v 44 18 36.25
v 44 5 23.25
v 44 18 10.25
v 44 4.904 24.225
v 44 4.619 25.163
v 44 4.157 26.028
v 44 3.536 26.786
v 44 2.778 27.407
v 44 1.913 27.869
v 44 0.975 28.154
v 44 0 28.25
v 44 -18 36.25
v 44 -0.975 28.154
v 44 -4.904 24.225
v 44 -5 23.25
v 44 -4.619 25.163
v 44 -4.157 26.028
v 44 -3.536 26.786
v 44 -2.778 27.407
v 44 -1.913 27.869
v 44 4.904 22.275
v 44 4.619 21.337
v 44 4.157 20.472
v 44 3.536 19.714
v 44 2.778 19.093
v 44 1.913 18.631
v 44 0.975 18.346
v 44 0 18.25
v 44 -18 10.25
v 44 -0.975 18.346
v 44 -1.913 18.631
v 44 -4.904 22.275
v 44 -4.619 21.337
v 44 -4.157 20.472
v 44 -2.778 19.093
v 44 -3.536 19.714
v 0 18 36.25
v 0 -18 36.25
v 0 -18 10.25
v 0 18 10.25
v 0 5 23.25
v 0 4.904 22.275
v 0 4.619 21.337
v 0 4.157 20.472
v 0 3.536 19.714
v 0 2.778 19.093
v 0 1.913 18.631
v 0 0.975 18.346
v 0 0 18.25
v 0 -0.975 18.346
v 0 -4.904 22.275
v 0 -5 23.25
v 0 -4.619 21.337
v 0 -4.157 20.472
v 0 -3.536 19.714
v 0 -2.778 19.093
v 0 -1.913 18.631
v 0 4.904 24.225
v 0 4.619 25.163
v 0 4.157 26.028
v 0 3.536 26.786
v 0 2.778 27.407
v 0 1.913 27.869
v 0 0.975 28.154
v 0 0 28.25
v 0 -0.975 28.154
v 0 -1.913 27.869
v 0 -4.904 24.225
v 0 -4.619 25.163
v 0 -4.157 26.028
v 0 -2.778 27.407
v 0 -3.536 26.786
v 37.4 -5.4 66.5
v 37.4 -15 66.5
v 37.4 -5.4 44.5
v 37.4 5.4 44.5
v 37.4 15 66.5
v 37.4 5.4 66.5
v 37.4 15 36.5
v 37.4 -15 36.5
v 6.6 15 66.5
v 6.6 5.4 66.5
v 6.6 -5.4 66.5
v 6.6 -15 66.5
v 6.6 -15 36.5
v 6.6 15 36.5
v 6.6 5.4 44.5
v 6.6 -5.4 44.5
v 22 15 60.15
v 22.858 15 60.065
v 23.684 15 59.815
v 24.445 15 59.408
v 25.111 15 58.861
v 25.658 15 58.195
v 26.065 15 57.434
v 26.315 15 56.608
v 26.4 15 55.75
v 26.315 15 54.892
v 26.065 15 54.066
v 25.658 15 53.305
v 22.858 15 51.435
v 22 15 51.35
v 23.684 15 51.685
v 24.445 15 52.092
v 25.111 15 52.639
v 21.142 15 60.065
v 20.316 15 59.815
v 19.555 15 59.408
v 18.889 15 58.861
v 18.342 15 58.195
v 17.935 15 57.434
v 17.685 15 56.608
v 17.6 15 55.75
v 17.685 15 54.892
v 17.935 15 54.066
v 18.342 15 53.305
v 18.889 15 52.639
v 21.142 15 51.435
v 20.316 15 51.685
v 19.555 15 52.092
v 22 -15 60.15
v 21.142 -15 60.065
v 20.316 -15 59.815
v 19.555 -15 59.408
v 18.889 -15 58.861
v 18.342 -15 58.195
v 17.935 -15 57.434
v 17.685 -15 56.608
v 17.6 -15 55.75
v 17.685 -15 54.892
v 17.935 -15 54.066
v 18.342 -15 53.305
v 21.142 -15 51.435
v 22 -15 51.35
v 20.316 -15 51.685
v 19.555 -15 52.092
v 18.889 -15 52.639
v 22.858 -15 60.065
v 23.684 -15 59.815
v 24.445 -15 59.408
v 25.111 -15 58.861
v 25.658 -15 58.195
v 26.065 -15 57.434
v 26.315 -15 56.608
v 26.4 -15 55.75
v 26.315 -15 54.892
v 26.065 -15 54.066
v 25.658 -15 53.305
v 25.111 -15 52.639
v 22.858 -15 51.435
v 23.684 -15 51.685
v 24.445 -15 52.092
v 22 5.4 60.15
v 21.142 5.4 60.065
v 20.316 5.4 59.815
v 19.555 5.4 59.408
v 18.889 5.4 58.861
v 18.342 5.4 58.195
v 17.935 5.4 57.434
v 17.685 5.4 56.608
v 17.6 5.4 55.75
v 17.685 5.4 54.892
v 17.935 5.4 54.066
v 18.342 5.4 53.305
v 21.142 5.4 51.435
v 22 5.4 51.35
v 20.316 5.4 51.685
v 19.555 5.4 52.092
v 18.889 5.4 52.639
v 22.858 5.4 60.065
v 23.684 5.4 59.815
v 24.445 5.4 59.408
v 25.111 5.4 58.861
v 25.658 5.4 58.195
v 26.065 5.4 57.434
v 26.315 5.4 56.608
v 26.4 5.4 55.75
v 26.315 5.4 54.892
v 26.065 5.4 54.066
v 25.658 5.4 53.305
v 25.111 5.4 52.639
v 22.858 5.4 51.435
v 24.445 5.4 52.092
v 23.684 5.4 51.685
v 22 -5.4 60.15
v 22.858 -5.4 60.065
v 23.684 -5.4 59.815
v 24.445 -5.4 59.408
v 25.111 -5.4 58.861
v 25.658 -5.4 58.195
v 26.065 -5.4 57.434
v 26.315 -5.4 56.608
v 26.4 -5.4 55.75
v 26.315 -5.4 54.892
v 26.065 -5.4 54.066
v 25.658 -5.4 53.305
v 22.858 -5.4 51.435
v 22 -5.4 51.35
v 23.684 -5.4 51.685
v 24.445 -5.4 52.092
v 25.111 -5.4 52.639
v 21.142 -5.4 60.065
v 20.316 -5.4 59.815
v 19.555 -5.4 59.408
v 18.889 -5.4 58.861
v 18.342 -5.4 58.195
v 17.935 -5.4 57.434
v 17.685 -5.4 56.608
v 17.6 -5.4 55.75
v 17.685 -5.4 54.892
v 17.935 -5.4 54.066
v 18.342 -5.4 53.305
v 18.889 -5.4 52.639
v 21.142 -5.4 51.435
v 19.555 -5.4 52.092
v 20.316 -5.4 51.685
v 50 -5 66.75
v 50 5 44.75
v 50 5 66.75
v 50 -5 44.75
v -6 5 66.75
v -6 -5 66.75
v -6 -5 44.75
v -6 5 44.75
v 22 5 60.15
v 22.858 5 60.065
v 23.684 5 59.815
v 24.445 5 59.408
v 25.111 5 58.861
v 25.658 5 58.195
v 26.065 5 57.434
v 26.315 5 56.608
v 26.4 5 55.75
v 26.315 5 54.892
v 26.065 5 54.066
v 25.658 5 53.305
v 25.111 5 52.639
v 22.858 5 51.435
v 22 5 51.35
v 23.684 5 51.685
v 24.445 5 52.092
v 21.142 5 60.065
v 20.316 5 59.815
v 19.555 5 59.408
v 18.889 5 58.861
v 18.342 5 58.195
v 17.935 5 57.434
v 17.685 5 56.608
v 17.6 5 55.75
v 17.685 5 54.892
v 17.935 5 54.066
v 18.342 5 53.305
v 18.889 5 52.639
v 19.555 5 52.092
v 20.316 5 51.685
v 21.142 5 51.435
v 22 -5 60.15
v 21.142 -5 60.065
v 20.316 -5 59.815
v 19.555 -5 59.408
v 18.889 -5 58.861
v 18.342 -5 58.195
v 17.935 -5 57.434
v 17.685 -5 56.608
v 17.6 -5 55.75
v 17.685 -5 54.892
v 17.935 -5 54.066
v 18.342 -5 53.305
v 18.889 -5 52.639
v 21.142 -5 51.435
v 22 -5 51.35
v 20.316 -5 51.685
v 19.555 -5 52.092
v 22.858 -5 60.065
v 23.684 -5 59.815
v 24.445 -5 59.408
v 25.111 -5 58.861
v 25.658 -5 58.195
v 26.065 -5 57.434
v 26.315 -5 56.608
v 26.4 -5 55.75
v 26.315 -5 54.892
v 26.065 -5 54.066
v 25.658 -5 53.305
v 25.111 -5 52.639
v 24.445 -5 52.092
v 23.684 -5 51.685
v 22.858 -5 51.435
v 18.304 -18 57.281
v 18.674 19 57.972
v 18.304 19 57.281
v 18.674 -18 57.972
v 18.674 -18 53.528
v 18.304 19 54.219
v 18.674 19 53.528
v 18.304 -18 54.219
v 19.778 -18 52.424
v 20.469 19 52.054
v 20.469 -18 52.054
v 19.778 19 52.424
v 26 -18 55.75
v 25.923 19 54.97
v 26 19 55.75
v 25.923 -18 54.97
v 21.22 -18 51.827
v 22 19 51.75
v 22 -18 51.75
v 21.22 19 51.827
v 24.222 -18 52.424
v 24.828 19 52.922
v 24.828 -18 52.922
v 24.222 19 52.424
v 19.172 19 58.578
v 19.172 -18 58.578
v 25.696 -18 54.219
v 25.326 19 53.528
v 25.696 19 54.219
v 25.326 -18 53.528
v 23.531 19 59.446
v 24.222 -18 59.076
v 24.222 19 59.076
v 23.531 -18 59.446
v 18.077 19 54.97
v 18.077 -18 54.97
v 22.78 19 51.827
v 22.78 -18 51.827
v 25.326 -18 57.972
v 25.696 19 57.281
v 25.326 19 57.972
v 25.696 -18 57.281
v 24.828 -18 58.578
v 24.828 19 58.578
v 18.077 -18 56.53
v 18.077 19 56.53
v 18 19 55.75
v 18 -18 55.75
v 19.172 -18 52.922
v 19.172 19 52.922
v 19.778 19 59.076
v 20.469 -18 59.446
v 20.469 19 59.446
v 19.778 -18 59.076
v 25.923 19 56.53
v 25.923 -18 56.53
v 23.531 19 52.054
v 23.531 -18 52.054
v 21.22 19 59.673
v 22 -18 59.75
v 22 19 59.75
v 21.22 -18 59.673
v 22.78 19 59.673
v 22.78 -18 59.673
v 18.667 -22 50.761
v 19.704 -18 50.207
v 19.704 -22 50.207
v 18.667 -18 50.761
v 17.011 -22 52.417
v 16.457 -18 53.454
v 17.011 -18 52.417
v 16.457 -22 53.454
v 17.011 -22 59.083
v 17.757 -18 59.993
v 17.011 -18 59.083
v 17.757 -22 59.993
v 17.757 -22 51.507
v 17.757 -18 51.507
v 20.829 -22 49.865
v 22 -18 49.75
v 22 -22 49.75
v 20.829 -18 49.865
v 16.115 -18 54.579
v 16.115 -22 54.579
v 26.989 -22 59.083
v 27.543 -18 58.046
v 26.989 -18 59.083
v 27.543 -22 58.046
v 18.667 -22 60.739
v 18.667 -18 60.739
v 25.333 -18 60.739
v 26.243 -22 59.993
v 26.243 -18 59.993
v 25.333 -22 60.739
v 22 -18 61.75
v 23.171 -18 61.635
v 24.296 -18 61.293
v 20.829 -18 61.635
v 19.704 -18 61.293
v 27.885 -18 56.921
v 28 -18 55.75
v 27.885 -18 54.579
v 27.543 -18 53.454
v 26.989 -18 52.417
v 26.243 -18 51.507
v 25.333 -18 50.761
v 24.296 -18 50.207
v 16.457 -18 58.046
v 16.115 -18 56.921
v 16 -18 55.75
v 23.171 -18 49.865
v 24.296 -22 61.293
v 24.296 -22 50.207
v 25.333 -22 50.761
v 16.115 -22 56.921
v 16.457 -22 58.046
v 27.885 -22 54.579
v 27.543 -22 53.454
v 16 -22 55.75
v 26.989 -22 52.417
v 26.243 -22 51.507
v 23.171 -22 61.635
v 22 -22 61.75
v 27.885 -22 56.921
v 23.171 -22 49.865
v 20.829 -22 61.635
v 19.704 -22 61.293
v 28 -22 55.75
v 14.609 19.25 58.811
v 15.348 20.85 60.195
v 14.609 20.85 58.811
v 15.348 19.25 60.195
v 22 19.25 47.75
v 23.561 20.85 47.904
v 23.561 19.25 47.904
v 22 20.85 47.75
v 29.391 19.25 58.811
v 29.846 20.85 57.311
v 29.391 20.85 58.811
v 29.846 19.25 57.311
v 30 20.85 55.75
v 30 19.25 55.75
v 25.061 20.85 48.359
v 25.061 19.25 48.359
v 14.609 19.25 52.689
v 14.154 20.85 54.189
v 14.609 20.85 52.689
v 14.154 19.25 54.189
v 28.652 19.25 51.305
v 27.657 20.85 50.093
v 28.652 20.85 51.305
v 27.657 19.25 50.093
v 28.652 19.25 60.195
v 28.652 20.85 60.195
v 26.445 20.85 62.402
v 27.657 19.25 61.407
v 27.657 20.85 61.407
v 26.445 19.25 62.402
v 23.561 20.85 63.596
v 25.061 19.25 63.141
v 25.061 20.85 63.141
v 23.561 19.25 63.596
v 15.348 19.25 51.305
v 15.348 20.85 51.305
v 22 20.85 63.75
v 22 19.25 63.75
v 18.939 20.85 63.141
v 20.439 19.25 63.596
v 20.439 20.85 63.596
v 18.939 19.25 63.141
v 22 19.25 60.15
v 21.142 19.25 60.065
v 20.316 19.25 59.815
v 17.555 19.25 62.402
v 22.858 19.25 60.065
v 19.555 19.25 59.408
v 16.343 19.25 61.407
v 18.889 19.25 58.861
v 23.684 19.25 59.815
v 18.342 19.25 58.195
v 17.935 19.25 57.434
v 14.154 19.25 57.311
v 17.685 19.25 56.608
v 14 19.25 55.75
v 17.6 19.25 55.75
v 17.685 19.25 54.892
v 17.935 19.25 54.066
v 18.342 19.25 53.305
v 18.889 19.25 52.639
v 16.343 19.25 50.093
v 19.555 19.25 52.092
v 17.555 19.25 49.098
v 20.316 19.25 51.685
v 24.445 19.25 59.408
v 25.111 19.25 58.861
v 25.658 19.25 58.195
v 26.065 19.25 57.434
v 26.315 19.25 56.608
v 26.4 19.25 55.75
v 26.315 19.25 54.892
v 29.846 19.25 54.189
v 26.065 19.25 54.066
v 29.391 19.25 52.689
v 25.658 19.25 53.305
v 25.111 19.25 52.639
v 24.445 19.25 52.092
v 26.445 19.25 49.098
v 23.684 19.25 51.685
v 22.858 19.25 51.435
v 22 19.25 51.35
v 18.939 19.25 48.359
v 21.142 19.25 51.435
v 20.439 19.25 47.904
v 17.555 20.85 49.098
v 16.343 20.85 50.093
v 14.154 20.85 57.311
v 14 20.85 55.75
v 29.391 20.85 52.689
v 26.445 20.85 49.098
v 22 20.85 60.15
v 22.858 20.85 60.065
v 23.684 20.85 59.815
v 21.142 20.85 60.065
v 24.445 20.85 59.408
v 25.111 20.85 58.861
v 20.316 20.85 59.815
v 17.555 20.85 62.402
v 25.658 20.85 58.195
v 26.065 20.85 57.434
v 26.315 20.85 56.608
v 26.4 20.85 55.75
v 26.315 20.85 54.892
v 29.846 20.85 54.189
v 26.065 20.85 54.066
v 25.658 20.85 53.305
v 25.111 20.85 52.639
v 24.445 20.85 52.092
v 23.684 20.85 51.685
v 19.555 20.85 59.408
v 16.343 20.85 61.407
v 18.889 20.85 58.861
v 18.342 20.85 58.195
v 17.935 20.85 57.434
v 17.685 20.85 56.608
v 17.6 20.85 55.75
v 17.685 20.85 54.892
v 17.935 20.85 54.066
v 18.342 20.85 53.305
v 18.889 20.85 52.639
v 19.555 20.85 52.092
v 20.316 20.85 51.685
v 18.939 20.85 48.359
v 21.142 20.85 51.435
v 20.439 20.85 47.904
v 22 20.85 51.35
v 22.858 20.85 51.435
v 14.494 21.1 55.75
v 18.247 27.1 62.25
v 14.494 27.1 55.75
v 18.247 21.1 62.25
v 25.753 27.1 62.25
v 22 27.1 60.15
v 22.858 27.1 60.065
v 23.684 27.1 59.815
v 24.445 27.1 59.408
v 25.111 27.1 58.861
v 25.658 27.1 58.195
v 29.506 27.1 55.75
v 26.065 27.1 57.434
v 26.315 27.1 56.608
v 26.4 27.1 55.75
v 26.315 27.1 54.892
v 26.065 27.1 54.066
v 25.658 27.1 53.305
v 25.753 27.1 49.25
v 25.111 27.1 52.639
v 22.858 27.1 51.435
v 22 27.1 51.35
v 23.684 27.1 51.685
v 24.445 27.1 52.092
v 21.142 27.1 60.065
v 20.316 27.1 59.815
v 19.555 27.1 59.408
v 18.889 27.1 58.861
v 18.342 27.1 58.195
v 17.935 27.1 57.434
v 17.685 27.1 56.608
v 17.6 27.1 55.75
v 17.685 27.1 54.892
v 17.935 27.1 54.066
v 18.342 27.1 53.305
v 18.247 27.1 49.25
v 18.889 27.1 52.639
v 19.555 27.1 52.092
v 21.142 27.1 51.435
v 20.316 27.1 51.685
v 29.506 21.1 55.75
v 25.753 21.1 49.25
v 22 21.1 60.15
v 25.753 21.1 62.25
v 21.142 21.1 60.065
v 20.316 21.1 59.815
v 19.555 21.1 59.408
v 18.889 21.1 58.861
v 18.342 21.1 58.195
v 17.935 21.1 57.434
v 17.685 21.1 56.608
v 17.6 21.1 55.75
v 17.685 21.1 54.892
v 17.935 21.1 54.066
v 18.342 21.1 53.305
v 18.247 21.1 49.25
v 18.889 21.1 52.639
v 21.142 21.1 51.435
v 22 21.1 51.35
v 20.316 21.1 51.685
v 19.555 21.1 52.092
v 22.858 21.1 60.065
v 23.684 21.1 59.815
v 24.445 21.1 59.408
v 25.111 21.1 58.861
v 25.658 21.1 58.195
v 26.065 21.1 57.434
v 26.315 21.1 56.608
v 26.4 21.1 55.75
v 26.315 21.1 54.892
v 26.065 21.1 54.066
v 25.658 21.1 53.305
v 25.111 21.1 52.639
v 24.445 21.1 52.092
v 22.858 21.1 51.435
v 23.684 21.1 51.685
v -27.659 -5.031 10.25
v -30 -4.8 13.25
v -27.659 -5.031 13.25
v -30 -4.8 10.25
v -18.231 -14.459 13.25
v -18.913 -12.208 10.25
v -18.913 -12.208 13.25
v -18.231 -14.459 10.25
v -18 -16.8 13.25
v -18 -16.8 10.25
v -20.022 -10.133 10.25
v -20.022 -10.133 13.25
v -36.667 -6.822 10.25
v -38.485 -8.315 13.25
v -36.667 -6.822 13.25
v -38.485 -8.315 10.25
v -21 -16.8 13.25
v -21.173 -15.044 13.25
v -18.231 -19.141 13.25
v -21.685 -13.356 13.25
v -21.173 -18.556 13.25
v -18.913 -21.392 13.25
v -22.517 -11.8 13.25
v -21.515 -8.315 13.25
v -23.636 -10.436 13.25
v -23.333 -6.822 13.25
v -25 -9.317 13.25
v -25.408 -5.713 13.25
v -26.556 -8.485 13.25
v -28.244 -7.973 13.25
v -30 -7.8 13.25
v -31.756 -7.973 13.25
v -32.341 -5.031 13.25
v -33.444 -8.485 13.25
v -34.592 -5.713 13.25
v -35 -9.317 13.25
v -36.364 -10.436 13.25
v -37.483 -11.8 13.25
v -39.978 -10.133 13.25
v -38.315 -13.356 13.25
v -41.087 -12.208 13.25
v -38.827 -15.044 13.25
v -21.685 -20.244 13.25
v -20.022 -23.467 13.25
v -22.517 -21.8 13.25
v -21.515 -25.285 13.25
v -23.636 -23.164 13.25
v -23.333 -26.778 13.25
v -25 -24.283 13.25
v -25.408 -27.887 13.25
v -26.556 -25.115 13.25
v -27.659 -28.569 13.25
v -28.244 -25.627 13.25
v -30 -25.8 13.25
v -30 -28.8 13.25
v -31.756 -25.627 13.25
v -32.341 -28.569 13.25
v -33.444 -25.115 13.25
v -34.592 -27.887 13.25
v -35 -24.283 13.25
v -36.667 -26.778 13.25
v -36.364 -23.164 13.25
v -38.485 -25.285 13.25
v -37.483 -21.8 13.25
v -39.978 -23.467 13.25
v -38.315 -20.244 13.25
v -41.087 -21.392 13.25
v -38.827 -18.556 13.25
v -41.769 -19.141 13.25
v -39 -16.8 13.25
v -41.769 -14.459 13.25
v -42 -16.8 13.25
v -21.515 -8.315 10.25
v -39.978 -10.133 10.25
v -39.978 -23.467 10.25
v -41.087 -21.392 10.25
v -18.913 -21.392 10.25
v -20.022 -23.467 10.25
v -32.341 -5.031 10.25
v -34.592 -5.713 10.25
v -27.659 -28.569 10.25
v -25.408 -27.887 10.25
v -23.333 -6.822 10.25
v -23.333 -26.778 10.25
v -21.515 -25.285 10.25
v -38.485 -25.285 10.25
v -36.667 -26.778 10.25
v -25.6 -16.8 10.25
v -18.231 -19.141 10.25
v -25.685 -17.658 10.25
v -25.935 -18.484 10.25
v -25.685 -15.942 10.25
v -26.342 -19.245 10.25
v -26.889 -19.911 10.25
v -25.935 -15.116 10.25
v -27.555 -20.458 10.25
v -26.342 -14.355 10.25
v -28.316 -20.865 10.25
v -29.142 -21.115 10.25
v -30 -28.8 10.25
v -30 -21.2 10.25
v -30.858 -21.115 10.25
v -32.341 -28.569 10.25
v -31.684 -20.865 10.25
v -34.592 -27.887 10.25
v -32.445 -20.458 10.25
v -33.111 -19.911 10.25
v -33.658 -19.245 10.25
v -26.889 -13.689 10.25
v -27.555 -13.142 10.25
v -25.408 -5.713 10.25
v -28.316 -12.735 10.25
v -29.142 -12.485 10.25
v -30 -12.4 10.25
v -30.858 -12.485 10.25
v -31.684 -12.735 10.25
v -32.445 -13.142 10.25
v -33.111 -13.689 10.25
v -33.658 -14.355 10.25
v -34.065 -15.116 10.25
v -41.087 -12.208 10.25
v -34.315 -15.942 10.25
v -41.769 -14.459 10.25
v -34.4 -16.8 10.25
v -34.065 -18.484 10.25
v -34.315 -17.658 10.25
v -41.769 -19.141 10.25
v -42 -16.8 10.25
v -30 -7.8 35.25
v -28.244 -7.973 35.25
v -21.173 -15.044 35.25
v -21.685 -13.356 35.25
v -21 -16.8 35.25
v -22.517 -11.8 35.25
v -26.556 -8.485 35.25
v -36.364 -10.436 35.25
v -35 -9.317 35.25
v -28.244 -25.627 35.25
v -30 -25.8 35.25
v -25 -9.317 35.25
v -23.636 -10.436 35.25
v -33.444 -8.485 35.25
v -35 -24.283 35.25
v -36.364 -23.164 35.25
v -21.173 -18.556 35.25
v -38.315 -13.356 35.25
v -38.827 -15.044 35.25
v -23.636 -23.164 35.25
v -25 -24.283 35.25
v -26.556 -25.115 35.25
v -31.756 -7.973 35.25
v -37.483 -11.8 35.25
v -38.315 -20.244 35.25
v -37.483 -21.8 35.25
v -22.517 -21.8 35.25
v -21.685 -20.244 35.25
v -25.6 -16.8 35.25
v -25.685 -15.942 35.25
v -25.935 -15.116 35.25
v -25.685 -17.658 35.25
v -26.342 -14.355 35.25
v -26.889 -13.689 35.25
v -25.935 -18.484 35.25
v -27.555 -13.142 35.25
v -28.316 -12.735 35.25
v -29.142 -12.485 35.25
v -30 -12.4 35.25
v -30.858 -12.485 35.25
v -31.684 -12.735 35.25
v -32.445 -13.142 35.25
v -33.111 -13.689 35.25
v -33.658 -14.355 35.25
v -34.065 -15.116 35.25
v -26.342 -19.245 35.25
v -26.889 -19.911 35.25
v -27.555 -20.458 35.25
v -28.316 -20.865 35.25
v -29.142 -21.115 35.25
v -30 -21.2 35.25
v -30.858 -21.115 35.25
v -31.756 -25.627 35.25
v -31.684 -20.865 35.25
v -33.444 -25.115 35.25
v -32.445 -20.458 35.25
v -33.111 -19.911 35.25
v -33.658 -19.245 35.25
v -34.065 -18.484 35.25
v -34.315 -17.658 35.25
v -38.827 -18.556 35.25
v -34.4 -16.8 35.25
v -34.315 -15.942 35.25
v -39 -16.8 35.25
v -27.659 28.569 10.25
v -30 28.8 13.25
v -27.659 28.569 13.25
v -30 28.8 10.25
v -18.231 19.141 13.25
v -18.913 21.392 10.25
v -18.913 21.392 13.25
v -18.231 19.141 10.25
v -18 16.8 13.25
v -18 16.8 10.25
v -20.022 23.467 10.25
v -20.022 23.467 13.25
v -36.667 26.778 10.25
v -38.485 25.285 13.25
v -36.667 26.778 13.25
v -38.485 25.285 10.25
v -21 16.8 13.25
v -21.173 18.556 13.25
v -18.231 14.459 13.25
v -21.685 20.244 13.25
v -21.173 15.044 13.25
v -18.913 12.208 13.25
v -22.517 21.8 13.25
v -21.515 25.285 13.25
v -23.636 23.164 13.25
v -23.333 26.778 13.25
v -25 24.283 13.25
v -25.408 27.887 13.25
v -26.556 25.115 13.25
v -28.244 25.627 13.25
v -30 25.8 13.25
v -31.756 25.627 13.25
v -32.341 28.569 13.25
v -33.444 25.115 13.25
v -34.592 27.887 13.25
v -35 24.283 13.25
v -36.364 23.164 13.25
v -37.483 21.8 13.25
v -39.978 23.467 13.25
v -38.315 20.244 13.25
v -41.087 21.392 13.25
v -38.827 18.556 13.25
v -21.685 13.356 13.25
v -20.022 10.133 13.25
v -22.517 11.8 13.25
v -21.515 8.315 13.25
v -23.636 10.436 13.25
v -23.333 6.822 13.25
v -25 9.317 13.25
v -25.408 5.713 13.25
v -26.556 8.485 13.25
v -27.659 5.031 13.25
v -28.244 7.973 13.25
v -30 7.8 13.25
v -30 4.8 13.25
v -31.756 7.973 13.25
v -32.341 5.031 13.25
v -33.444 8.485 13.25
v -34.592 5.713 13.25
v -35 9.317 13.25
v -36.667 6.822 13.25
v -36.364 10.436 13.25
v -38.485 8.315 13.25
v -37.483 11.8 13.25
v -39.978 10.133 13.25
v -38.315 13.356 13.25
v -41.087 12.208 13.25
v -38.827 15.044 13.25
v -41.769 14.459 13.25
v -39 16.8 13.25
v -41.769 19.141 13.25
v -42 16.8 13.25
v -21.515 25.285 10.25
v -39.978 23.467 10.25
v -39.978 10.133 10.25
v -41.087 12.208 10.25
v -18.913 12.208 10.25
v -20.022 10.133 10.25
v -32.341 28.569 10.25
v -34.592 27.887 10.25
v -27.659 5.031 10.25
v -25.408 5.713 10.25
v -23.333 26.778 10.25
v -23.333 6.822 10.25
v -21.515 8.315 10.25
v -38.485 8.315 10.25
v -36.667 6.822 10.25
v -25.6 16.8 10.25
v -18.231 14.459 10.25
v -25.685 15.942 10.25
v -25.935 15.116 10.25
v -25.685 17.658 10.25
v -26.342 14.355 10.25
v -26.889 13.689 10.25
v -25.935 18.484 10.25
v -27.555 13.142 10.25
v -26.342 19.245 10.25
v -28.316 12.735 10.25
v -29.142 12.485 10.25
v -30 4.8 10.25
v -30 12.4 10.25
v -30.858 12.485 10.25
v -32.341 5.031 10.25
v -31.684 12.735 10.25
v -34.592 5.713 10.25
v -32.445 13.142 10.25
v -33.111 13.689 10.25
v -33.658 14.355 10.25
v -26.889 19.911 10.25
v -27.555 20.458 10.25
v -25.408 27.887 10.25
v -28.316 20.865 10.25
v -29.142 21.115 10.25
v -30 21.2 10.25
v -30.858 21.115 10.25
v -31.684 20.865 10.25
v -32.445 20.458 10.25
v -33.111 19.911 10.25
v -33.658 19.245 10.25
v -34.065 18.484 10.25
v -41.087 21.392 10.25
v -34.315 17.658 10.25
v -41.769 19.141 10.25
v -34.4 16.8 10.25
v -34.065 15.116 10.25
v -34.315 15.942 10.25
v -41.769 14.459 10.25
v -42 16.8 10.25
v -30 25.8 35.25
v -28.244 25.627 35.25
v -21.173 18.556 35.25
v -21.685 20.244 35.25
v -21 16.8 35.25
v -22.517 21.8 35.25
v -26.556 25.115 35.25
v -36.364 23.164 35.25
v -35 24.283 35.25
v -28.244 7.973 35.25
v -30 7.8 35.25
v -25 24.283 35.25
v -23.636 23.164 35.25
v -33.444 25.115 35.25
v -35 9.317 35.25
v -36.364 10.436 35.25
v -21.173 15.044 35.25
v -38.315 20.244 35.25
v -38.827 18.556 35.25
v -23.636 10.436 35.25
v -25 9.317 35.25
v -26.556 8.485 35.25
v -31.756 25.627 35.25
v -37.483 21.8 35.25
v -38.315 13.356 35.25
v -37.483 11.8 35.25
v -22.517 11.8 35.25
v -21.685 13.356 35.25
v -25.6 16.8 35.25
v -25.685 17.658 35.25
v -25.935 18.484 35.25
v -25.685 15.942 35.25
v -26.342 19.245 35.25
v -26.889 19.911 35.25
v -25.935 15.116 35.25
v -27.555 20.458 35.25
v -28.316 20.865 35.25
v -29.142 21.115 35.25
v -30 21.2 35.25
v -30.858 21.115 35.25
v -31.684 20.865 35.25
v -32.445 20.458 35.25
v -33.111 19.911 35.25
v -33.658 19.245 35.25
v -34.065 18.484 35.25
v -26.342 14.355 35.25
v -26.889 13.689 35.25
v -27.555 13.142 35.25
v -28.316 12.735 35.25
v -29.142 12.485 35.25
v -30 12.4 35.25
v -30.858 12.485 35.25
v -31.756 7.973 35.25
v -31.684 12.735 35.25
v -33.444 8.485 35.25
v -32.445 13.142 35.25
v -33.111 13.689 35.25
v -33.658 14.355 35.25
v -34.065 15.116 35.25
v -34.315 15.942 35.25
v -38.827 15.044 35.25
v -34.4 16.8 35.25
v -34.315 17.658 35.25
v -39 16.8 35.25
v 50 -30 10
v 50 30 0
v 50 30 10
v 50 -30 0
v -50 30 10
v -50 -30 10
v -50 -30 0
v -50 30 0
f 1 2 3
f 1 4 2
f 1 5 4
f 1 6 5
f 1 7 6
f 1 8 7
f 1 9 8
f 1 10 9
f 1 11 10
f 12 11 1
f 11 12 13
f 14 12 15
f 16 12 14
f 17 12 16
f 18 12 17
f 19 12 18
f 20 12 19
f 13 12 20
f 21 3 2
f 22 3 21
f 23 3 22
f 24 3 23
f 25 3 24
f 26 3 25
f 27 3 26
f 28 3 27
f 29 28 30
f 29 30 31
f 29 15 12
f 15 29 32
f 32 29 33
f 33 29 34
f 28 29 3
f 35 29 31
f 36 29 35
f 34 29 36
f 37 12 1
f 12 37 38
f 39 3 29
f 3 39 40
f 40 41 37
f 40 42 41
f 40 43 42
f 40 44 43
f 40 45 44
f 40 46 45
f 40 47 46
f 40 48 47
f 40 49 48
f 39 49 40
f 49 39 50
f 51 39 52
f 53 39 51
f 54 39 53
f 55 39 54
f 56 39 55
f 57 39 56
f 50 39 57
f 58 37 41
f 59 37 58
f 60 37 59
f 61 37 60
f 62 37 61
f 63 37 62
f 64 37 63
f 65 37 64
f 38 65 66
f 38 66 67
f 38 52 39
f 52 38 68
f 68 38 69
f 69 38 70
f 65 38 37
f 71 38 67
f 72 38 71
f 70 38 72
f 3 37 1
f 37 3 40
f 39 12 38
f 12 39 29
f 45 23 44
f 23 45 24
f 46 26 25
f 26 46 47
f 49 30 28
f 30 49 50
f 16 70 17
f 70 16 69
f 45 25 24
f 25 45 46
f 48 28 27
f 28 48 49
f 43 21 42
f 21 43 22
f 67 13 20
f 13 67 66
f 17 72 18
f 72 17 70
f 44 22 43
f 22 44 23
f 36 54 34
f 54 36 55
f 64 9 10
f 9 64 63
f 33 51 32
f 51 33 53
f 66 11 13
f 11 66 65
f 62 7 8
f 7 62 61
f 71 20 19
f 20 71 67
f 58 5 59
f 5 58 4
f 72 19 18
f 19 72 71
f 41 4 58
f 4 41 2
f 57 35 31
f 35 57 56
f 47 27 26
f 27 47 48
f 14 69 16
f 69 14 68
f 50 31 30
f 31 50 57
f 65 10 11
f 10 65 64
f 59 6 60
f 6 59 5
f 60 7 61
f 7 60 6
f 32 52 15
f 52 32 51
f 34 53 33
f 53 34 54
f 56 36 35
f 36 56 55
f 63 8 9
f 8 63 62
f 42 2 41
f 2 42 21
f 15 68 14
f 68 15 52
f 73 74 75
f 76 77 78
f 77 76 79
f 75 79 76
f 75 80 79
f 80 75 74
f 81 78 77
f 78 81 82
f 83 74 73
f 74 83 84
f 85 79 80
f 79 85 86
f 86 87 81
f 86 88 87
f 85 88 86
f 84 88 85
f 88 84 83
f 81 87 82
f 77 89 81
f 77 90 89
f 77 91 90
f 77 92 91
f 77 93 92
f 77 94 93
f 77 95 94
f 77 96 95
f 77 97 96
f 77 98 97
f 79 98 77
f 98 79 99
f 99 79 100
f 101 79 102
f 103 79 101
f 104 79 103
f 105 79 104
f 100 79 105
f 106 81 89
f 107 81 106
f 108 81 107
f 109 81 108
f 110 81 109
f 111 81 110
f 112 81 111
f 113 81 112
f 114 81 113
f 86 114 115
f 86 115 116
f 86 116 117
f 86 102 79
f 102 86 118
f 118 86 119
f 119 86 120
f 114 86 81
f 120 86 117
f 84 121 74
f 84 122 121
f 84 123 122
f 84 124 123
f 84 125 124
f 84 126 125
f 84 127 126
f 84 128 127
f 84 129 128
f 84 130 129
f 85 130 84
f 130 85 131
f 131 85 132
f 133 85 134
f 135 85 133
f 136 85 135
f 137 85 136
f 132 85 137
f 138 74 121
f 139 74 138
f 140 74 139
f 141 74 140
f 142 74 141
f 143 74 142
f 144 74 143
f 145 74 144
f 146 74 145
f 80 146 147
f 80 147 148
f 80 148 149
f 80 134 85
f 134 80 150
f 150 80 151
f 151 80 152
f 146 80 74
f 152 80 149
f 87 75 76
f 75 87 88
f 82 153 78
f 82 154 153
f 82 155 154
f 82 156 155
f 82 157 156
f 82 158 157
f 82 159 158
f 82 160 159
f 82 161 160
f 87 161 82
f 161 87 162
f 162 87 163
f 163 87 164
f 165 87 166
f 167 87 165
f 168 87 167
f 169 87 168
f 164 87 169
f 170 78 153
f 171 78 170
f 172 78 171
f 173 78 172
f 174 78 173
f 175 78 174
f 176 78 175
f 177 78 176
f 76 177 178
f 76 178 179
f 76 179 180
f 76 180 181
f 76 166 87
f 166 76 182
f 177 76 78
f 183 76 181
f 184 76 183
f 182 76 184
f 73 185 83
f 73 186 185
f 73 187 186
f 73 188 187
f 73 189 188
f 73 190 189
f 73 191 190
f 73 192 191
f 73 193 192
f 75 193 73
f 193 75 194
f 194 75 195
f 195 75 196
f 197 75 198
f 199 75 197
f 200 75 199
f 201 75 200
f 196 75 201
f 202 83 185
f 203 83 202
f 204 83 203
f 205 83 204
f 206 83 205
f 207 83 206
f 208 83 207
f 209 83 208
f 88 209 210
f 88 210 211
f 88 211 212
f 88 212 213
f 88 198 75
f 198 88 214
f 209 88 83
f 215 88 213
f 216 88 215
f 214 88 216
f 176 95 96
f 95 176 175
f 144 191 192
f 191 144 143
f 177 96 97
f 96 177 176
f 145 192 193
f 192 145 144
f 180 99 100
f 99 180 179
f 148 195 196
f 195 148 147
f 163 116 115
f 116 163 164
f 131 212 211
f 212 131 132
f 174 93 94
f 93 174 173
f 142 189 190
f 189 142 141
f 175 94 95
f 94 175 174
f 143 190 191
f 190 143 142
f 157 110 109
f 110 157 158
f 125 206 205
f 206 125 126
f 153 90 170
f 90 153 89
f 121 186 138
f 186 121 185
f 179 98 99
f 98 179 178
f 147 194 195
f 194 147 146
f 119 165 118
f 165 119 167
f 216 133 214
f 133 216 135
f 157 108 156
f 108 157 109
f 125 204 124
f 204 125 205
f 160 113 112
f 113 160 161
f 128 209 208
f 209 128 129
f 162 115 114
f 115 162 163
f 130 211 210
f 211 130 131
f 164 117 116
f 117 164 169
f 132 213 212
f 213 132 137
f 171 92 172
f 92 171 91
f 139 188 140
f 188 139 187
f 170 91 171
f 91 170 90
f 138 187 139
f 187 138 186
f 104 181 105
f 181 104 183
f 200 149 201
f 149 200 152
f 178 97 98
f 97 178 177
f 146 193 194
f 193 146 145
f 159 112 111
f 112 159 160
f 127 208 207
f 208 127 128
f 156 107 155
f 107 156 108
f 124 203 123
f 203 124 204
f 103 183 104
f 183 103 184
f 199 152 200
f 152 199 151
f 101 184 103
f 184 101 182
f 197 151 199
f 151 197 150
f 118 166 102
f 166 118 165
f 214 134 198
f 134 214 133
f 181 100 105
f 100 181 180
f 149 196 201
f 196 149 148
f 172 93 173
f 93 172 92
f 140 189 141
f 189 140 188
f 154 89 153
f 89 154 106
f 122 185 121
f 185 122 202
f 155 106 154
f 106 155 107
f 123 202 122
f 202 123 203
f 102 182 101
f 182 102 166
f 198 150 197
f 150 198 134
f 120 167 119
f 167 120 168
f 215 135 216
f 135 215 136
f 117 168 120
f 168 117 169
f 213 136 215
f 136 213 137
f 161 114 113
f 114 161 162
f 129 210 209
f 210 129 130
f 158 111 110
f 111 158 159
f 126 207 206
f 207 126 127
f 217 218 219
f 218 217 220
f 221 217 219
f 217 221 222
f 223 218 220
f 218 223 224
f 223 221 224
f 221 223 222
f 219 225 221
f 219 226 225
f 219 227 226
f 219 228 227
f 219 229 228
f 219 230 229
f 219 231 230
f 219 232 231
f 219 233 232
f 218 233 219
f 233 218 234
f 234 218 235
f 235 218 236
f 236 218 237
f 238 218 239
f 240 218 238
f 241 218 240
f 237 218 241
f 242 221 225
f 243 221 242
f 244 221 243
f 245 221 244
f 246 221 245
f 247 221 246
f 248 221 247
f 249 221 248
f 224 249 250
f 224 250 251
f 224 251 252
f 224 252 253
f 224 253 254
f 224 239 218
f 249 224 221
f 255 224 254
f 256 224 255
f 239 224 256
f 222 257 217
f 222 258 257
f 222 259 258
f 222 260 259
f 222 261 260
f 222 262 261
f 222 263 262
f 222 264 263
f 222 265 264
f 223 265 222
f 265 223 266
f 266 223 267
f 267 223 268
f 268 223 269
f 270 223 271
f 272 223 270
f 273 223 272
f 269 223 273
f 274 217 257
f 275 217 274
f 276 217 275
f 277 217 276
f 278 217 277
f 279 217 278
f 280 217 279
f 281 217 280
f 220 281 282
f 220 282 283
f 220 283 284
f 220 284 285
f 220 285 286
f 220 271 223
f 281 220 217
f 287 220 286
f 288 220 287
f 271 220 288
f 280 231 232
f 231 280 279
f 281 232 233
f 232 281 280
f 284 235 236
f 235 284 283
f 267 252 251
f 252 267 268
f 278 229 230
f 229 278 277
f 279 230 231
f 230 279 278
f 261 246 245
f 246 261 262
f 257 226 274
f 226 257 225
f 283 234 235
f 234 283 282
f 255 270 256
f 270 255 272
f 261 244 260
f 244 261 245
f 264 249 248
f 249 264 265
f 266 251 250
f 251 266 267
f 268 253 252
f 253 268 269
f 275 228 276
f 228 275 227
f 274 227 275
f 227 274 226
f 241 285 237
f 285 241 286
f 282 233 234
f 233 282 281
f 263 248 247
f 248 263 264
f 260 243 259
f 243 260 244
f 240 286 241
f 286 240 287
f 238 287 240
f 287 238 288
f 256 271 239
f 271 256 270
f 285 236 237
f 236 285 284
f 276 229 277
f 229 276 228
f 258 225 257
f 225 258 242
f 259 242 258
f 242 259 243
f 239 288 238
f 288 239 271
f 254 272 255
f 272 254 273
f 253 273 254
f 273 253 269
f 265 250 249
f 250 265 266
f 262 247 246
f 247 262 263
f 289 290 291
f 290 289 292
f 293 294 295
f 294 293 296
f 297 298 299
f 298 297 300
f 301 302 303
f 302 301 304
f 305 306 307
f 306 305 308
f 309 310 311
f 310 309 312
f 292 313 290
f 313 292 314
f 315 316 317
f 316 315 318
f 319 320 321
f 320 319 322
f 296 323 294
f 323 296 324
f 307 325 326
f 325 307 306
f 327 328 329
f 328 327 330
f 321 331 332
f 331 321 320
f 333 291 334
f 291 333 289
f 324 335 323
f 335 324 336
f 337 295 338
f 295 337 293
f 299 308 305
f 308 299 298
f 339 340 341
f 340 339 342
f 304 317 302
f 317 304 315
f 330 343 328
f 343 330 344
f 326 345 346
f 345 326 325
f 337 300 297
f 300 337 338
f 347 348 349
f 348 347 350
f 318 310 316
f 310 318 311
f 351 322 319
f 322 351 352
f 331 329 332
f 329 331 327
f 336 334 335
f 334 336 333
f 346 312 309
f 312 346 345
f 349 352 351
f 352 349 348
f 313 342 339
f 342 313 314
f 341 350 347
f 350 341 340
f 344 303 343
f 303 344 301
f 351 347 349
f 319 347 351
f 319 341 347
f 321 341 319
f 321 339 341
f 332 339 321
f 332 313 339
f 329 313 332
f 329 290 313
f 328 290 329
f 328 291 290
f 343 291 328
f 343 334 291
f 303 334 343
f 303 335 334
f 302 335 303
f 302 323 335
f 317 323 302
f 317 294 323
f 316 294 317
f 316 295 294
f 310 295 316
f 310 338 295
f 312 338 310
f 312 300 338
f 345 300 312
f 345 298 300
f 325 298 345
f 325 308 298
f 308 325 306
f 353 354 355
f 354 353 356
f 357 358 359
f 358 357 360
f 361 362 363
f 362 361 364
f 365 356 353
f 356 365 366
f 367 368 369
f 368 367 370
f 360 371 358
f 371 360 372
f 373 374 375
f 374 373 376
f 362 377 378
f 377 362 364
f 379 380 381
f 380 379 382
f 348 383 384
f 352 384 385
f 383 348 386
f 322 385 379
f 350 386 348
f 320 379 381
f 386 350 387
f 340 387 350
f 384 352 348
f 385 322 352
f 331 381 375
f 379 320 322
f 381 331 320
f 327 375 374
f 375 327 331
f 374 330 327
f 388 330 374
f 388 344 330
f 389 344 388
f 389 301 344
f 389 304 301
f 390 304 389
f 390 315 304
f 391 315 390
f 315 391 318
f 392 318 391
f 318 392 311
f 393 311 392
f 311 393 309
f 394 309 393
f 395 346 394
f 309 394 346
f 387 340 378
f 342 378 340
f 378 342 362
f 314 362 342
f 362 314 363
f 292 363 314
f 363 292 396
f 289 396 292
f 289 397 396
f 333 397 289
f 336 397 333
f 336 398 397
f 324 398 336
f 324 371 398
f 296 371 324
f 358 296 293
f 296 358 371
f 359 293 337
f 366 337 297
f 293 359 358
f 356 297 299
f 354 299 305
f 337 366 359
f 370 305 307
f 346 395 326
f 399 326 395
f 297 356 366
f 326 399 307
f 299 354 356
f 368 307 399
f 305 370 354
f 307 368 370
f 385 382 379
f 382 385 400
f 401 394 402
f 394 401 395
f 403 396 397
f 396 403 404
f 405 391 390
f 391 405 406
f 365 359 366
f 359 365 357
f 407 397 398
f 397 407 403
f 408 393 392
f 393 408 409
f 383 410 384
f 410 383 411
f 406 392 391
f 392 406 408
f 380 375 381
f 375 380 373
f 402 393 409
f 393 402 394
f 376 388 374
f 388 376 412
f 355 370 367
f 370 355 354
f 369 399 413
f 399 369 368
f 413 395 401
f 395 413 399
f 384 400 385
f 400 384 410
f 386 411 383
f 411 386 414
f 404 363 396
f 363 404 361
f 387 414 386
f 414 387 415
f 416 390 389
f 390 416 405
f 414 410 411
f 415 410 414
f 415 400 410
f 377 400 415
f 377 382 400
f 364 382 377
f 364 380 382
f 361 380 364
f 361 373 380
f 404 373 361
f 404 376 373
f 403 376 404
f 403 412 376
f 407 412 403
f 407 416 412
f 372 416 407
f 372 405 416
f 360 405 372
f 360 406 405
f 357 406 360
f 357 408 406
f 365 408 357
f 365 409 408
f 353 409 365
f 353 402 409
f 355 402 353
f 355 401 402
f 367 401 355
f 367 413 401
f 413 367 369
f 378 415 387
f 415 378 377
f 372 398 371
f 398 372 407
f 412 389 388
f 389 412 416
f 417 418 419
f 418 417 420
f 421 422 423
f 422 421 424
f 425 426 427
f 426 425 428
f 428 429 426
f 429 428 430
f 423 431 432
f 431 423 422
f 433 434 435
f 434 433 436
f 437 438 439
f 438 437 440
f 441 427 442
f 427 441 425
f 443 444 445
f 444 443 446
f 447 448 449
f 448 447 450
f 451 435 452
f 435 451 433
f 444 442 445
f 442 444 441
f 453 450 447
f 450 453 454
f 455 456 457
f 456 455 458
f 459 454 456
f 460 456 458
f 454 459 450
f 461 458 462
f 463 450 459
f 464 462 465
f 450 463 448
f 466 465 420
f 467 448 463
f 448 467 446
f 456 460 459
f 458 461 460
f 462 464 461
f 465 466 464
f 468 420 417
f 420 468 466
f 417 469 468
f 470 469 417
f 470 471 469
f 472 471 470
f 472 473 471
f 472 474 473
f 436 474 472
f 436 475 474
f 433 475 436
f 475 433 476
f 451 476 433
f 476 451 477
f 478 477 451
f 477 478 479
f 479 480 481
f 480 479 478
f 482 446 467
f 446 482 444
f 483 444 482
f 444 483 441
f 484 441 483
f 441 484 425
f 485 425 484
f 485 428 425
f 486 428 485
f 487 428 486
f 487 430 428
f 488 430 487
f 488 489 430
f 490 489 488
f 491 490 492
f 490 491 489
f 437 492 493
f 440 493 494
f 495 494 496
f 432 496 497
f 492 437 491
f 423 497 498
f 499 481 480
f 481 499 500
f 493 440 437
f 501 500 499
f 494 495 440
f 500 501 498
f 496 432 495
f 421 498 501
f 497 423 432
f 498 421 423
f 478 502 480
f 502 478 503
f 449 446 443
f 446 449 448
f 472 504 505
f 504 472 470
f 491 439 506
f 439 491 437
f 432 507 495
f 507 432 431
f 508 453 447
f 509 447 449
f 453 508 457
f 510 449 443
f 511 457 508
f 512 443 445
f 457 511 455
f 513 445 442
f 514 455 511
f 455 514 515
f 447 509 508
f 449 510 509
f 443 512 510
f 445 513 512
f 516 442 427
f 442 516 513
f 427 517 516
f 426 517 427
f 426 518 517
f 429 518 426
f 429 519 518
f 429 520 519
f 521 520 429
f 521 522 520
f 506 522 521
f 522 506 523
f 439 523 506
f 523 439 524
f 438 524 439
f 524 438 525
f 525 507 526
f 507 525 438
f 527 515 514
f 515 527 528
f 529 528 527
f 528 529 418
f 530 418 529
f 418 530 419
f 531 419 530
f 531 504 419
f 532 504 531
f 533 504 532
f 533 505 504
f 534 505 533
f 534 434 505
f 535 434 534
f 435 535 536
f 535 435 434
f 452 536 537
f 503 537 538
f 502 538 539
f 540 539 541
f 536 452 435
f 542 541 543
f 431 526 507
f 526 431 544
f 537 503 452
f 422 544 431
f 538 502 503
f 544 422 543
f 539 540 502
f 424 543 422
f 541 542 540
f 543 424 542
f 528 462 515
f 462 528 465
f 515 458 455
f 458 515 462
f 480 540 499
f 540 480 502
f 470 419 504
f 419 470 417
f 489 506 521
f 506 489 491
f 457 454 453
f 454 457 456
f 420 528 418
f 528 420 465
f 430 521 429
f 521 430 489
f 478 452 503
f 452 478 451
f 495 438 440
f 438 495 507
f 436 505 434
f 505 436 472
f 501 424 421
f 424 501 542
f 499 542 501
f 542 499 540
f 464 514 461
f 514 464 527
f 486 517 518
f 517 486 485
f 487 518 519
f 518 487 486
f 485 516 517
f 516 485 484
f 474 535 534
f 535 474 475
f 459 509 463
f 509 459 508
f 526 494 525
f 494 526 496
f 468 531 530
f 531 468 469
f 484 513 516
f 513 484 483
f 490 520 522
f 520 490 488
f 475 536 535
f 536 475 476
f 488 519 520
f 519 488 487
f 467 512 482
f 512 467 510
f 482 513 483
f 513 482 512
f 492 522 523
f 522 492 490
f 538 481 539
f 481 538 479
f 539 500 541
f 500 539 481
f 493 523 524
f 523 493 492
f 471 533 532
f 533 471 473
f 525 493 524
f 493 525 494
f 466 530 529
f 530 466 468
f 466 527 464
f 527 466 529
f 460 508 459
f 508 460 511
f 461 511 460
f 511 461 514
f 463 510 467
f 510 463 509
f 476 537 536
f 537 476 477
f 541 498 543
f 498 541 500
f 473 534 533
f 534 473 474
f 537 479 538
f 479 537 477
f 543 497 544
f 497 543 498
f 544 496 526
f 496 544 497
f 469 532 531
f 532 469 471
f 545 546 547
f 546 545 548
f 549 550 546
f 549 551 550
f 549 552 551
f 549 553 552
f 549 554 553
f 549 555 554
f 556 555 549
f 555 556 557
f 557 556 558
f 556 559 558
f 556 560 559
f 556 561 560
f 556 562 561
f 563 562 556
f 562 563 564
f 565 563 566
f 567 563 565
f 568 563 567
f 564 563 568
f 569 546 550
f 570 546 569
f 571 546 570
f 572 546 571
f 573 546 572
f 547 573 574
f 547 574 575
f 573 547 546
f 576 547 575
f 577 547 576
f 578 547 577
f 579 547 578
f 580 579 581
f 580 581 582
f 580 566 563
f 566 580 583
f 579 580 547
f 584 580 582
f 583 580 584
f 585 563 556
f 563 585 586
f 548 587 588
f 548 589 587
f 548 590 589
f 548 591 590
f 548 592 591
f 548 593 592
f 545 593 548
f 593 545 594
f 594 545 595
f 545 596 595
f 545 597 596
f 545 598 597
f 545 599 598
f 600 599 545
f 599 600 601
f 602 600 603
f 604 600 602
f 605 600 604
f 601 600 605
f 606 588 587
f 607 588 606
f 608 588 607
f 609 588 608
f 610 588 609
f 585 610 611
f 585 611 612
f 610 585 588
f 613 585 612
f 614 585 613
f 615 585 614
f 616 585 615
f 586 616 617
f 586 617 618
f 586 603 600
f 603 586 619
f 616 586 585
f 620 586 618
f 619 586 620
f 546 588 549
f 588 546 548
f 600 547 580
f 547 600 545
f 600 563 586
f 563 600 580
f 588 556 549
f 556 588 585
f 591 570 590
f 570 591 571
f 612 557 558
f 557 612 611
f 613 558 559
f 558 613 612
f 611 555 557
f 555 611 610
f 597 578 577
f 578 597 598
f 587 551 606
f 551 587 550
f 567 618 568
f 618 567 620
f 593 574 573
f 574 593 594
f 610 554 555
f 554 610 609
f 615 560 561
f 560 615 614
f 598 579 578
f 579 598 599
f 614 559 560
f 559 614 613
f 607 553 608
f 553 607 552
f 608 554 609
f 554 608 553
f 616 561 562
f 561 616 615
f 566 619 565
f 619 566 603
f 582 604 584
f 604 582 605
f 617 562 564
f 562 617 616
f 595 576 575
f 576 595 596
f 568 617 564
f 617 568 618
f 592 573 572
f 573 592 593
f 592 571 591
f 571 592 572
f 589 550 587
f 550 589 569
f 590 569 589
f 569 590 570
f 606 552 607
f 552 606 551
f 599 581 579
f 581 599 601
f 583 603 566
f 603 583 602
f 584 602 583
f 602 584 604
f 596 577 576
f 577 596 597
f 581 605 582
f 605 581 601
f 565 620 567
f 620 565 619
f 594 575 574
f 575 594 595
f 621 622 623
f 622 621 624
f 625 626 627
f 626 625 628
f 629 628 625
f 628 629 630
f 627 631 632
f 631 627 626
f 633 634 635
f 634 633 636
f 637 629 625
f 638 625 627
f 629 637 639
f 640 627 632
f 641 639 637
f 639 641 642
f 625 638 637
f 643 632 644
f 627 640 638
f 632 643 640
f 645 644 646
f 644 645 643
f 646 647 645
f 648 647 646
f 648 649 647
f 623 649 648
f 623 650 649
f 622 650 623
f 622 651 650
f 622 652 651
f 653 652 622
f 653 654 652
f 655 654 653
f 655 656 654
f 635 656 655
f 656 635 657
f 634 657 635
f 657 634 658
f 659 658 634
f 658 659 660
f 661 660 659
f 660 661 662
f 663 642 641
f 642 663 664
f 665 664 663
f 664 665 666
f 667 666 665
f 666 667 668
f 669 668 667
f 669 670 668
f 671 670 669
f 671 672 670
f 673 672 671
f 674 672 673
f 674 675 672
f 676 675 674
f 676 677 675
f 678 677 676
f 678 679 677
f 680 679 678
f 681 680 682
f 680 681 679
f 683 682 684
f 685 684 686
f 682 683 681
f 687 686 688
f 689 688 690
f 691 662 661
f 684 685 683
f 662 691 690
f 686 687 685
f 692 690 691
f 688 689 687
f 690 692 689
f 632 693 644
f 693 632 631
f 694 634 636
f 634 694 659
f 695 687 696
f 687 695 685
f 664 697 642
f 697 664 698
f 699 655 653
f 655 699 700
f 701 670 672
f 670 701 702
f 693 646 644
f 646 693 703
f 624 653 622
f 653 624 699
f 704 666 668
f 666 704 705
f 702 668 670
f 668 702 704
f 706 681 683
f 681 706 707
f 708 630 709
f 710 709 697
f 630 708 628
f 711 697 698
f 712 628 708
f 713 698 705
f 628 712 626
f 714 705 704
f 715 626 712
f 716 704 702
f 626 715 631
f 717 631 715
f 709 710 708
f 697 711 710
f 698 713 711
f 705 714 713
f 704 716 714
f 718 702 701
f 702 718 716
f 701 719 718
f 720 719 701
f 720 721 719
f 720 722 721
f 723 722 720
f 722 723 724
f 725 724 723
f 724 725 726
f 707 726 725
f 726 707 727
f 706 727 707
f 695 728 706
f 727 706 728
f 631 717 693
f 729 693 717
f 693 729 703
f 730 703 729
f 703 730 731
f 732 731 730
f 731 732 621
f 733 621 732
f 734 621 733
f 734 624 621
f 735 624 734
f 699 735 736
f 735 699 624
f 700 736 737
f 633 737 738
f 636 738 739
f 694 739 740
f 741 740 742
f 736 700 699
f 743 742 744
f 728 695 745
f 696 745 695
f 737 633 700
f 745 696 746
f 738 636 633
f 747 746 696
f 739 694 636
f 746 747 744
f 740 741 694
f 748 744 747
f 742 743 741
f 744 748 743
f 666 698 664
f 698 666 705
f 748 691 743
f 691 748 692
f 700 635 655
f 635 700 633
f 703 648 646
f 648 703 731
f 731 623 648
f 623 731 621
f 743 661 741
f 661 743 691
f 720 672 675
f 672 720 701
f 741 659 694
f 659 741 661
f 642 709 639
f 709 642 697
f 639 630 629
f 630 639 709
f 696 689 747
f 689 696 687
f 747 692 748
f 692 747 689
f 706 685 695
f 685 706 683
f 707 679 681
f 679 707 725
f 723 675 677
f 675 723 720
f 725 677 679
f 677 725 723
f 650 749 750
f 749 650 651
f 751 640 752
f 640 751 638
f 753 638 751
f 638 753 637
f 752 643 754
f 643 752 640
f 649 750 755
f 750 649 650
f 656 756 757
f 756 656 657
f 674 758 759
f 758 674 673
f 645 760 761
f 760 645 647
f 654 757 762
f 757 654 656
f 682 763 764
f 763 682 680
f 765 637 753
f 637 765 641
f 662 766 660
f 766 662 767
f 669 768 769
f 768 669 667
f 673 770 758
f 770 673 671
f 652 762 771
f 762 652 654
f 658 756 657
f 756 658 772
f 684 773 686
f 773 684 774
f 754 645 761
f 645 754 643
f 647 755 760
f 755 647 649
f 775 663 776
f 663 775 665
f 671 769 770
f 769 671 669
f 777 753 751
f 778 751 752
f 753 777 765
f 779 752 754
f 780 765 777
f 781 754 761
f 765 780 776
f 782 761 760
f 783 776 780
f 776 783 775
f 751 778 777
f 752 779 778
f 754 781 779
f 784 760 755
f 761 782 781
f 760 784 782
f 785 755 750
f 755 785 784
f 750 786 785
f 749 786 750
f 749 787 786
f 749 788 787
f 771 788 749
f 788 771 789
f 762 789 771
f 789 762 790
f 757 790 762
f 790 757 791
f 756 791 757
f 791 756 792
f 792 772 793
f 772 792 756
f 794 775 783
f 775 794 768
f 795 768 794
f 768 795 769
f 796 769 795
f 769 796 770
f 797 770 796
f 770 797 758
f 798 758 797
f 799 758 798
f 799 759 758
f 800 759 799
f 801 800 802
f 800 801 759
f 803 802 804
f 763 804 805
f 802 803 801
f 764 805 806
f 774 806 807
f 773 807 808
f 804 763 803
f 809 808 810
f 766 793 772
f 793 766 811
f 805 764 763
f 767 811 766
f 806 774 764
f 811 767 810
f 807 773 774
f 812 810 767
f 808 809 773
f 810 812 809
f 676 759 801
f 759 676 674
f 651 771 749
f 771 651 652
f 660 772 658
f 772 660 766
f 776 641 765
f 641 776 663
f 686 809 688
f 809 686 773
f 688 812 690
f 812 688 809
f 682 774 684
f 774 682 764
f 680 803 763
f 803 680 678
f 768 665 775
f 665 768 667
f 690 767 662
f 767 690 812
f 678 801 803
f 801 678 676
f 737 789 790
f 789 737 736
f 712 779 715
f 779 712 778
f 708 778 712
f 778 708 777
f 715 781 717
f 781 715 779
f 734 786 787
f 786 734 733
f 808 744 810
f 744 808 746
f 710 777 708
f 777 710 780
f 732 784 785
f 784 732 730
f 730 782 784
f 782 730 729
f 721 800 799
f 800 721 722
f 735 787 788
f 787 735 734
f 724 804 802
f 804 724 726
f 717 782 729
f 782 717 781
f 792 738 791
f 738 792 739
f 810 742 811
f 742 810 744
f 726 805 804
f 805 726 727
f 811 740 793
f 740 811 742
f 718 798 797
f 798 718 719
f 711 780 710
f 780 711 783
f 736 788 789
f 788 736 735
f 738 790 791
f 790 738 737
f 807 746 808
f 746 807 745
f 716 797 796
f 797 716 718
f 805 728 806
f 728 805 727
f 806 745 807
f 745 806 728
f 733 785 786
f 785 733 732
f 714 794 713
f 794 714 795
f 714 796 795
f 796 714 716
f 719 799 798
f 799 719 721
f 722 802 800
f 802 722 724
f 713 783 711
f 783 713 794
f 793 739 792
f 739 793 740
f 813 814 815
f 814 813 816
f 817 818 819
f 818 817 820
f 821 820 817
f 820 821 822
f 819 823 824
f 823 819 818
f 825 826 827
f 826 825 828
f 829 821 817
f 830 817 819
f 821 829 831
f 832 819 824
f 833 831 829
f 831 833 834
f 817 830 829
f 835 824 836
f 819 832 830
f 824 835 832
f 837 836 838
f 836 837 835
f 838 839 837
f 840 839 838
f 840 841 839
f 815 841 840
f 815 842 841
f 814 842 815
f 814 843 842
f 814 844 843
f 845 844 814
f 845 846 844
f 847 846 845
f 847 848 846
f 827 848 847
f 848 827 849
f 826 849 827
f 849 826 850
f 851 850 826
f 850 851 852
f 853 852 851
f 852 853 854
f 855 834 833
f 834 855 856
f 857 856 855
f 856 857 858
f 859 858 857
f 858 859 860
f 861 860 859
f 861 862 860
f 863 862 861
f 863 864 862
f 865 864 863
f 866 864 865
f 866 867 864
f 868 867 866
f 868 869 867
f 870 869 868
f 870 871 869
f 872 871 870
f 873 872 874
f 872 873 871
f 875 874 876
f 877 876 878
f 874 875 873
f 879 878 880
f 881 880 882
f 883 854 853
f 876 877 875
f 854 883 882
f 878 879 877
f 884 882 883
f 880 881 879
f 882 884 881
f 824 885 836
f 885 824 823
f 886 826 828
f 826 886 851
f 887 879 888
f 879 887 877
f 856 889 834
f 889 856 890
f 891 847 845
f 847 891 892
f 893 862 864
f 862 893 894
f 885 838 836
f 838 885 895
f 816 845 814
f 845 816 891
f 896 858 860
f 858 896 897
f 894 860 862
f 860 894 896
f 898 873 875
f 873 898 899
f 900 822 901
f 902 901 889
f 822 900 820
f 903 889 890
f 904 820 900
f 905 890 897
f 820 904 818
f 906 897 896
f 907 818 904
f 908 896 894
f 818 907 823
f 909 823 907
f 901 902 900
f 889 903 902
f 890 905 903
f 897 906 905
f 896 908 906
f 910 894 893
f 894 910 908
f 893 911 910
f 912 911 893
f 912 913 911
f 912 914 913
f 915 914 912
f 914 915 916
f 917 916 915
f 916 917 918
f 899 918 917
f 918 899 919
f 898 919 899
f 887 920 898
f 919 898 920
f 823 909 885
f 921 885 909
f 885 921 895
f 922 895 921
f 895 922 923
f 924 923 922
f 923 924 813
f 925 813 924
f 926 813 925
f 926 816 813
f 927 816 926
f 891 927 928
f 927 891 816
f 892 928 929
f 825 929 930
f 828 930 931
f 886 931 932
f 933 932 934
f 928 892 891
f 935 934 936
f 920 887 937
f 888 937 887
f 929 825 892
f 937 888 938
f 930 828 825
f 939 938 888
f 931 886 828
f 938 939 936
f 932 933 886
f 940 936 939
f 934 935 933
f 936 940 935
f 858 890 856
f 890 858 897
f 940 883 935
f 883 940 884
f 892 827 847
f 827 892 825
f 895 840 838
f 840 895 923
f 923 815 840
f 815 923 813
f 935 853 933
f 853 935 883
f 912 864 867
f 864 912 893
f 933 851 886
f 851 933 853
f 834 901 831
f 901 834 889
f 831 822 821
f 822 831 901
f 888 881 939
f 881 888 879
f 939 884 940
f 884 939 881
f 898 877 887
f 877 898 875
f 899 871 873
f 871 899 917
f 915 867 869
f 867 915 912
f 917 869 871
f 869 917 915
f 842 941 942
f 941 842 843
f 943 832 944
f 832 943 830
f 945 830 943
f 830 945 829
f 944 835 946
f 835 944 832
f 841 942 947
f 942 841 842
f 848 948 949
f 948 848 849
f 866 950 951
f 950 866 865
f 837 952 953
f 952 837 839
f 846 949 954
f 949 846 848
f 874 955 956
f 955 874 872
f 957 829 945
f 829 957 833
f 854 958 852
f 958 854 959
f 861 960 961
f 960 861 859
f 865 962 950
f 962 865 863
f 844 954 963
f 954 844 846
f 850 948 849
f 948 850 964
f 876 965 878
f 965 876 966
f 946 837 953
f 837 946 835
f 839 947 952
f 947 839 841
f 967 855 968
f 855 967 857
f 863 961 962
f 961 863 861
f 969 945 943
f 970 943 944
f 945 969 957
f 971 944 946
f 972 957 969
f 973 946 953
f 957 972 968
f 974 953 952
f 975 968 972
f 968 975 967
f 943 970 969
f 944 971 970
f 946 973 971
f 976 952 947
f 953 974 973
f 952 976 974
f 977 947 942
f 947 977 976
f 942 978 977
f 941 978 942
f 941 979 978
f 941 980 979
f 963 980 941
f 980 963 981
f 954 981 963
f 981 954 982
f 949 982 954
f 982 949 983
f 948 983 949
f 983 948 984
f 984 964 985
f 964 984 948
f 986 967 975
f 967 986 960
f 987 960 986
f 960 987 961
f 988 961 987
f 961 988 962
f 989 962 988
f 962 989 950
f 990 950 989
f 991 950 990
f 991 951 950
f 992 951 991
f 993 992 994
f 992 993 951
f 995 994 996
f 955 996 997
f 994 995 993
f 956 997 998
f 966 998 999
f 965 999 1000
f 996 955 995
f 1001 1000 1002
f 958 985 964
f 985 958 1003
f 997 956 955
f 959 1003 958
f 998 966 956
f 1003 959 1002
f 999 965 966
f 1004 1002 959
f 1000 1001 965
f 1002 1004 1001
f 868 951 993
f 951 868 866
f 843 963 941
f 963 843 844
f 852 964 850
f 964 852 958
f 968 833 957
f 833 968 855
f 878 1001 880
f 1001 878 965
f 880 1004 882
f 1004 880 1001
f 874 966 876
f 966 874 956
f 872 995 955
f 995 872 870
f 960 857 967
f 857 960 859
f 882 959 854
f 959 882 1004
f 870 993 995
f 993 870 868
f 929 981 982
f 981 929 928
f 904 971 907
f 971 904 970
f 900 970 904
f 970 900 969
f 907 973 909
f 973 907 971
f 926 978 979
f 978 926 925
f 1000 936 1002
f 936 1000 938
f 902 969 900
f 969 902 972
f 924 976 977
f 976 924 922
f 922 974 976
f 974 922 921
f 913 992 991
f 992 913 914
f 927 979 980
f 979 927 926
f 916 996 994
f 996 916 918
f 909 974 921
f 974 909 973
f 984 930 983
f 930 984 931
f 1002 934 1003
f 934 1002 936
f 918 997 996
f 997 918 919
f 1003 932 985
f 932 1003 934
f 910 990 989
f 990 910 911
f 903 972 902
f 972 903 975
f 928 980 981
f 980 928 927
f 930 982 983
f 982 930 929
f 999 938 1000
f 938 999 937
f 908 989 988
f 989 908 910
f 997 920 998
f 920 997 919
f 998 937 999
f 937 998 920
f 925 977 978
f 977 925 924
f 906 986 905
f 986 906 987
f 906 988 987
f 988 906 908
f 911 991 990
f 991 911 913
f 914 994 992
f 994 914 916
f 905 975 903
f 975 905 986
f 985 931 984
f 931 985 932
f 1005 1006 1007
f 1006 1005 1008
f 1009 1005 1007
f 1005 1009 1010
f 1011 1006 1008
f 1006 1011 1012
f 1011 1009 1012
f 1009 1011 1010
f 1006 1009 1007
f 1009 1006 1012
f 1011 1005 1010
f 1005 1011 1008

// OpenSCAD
$fn = 32;

// ------------------------------------------------------------------------
// Indexing jig: plate 100 x 60 mm, pin d8
// Every part is its own module, assembly() places every instance.
// ------------------------------------------------------------------------

// --- part 1 ---
module jig_plate() {
  difference() {
    translate([-50, -30, 0]) cube([100, 60, 10]);
  }
}

// --- part 2 ---
module locator_block() {
  difference() {
    translate([-22, -18, 0]) cube([44, 36, 26]);
    translate([0, 0, 13]) rotate([0, 90, 0]) cylinder(h = 46, d = 10, center = true);
  }
}

// --- part 3 ---
module index_fork() {
  difference() {
    translate([-15.4, -15, 0]) cube([30.8, 30, 30]);
    translate([-16.4, -5.4, 8]) cube([32.8, 10.8, 23]);
    translate([0, 0, 19.25]) rotate([90, 0, 0]) cylinder(h = 32, d = 8.8, center = true);
  }
}

// --- part 4 ---
module index_arm() {
  difference() {
    translate([-28, -5, 0]) cube([56, 10, 22]);
    translate([0, 0, 11]) rotate([90, 0, 0]) cylinder(h = 12, d = 8.8, center = true);
  }
}

// --- part 5 ---
module index_pin() {
  rotate([0, 90, 0]) cylinder(h = 38, d = 8, center = true);
  translate([-22, 0, 0]) rotate([0, 90, 0]) cylinder(h = 4, d = 12);
}

// --- part 6 ---
module pin_washer() {
  difference() {
      translate([0, 0, 0]) cylinder(h = 1.6, d = 16);
      translate([0, 0, -1]) cylinder(h = 3.6, d = 8.8);
    }
}

// --- part 7 ---
module lock_nut() {
  difference() {
    linear_extrude(height = 6) polygon(points = [[7.506, 0], [3.753, 6.5], [-3.753, 6.5], [-7.506, 0], [-3.753, -6.5], [3.753, -6.5]]);
    translate([0, 0, -1]) cylinder(h = 8, d = 8.8);
  }
}

// --- part 8 ---
module guide_bush_a() {
  difference() {
    union() {
      cylinder(h = 3, d = 24);
      translate([0, 0, 3]) cylinder(h = 22, d = 18);
    }
    translate([0, 0, -1]) cylinder(h = 27, d = 8.8);
  }
}

// --- part 9 ---
module guide_bush_b() {
  difference() {
    union() {
      cylinder(h = 3, d = 24);
      translate([0, 0, 3]) cylinder(h = 22, d = 18);
    }
    translate([0, 0, -1]) cylinder(h = 27, d = 8.8);
  }
}

// --- assembly ---
module assembly() {
  color([0.80, 0.24, 0.20]) translate([0, 0, 0]) rotate([0, 0, 0]) jig_plate();
  color([0.20, 0.45, 0.75]) translate([22, 0, 10.25]) rotate([0, 0, 0]) locator_block();
  color([0.25, 0.62, 0.32]) translate([22, 0, 36.5]) rotate([0, 0, 0]) index_fork();
  color([0.92, 0.70, 0.18]) translate([22, 0, 44.75]) rotate([0, 0, 0]) index_arm();
  color([0.58, 0.35, 0.70]) translate([22, 0, 55.75]) rotate([0, 0, 90]) index_pin();
  color([0.16, 0.66, 0.66]) translate([22, 20.85, 55.75]) rotate([90, 0, 0]) pin_washer();
  color([0.85, 0.48, 0.18]) translate([22, 27.1, 55.75]) rotate([90, 0, 0]) lock_nut();
  color([0.55, 0.60, 0.65]) translate([-30, -16.8, 10.25]) rotate([0, 0, 0]) guide_bush_a();
  color([0.75, 0.30, 0.55]) translate([-30, 16.8, 10.25]) rotate([0, 0, 0]) guide_bush_b();
}

assembly();
